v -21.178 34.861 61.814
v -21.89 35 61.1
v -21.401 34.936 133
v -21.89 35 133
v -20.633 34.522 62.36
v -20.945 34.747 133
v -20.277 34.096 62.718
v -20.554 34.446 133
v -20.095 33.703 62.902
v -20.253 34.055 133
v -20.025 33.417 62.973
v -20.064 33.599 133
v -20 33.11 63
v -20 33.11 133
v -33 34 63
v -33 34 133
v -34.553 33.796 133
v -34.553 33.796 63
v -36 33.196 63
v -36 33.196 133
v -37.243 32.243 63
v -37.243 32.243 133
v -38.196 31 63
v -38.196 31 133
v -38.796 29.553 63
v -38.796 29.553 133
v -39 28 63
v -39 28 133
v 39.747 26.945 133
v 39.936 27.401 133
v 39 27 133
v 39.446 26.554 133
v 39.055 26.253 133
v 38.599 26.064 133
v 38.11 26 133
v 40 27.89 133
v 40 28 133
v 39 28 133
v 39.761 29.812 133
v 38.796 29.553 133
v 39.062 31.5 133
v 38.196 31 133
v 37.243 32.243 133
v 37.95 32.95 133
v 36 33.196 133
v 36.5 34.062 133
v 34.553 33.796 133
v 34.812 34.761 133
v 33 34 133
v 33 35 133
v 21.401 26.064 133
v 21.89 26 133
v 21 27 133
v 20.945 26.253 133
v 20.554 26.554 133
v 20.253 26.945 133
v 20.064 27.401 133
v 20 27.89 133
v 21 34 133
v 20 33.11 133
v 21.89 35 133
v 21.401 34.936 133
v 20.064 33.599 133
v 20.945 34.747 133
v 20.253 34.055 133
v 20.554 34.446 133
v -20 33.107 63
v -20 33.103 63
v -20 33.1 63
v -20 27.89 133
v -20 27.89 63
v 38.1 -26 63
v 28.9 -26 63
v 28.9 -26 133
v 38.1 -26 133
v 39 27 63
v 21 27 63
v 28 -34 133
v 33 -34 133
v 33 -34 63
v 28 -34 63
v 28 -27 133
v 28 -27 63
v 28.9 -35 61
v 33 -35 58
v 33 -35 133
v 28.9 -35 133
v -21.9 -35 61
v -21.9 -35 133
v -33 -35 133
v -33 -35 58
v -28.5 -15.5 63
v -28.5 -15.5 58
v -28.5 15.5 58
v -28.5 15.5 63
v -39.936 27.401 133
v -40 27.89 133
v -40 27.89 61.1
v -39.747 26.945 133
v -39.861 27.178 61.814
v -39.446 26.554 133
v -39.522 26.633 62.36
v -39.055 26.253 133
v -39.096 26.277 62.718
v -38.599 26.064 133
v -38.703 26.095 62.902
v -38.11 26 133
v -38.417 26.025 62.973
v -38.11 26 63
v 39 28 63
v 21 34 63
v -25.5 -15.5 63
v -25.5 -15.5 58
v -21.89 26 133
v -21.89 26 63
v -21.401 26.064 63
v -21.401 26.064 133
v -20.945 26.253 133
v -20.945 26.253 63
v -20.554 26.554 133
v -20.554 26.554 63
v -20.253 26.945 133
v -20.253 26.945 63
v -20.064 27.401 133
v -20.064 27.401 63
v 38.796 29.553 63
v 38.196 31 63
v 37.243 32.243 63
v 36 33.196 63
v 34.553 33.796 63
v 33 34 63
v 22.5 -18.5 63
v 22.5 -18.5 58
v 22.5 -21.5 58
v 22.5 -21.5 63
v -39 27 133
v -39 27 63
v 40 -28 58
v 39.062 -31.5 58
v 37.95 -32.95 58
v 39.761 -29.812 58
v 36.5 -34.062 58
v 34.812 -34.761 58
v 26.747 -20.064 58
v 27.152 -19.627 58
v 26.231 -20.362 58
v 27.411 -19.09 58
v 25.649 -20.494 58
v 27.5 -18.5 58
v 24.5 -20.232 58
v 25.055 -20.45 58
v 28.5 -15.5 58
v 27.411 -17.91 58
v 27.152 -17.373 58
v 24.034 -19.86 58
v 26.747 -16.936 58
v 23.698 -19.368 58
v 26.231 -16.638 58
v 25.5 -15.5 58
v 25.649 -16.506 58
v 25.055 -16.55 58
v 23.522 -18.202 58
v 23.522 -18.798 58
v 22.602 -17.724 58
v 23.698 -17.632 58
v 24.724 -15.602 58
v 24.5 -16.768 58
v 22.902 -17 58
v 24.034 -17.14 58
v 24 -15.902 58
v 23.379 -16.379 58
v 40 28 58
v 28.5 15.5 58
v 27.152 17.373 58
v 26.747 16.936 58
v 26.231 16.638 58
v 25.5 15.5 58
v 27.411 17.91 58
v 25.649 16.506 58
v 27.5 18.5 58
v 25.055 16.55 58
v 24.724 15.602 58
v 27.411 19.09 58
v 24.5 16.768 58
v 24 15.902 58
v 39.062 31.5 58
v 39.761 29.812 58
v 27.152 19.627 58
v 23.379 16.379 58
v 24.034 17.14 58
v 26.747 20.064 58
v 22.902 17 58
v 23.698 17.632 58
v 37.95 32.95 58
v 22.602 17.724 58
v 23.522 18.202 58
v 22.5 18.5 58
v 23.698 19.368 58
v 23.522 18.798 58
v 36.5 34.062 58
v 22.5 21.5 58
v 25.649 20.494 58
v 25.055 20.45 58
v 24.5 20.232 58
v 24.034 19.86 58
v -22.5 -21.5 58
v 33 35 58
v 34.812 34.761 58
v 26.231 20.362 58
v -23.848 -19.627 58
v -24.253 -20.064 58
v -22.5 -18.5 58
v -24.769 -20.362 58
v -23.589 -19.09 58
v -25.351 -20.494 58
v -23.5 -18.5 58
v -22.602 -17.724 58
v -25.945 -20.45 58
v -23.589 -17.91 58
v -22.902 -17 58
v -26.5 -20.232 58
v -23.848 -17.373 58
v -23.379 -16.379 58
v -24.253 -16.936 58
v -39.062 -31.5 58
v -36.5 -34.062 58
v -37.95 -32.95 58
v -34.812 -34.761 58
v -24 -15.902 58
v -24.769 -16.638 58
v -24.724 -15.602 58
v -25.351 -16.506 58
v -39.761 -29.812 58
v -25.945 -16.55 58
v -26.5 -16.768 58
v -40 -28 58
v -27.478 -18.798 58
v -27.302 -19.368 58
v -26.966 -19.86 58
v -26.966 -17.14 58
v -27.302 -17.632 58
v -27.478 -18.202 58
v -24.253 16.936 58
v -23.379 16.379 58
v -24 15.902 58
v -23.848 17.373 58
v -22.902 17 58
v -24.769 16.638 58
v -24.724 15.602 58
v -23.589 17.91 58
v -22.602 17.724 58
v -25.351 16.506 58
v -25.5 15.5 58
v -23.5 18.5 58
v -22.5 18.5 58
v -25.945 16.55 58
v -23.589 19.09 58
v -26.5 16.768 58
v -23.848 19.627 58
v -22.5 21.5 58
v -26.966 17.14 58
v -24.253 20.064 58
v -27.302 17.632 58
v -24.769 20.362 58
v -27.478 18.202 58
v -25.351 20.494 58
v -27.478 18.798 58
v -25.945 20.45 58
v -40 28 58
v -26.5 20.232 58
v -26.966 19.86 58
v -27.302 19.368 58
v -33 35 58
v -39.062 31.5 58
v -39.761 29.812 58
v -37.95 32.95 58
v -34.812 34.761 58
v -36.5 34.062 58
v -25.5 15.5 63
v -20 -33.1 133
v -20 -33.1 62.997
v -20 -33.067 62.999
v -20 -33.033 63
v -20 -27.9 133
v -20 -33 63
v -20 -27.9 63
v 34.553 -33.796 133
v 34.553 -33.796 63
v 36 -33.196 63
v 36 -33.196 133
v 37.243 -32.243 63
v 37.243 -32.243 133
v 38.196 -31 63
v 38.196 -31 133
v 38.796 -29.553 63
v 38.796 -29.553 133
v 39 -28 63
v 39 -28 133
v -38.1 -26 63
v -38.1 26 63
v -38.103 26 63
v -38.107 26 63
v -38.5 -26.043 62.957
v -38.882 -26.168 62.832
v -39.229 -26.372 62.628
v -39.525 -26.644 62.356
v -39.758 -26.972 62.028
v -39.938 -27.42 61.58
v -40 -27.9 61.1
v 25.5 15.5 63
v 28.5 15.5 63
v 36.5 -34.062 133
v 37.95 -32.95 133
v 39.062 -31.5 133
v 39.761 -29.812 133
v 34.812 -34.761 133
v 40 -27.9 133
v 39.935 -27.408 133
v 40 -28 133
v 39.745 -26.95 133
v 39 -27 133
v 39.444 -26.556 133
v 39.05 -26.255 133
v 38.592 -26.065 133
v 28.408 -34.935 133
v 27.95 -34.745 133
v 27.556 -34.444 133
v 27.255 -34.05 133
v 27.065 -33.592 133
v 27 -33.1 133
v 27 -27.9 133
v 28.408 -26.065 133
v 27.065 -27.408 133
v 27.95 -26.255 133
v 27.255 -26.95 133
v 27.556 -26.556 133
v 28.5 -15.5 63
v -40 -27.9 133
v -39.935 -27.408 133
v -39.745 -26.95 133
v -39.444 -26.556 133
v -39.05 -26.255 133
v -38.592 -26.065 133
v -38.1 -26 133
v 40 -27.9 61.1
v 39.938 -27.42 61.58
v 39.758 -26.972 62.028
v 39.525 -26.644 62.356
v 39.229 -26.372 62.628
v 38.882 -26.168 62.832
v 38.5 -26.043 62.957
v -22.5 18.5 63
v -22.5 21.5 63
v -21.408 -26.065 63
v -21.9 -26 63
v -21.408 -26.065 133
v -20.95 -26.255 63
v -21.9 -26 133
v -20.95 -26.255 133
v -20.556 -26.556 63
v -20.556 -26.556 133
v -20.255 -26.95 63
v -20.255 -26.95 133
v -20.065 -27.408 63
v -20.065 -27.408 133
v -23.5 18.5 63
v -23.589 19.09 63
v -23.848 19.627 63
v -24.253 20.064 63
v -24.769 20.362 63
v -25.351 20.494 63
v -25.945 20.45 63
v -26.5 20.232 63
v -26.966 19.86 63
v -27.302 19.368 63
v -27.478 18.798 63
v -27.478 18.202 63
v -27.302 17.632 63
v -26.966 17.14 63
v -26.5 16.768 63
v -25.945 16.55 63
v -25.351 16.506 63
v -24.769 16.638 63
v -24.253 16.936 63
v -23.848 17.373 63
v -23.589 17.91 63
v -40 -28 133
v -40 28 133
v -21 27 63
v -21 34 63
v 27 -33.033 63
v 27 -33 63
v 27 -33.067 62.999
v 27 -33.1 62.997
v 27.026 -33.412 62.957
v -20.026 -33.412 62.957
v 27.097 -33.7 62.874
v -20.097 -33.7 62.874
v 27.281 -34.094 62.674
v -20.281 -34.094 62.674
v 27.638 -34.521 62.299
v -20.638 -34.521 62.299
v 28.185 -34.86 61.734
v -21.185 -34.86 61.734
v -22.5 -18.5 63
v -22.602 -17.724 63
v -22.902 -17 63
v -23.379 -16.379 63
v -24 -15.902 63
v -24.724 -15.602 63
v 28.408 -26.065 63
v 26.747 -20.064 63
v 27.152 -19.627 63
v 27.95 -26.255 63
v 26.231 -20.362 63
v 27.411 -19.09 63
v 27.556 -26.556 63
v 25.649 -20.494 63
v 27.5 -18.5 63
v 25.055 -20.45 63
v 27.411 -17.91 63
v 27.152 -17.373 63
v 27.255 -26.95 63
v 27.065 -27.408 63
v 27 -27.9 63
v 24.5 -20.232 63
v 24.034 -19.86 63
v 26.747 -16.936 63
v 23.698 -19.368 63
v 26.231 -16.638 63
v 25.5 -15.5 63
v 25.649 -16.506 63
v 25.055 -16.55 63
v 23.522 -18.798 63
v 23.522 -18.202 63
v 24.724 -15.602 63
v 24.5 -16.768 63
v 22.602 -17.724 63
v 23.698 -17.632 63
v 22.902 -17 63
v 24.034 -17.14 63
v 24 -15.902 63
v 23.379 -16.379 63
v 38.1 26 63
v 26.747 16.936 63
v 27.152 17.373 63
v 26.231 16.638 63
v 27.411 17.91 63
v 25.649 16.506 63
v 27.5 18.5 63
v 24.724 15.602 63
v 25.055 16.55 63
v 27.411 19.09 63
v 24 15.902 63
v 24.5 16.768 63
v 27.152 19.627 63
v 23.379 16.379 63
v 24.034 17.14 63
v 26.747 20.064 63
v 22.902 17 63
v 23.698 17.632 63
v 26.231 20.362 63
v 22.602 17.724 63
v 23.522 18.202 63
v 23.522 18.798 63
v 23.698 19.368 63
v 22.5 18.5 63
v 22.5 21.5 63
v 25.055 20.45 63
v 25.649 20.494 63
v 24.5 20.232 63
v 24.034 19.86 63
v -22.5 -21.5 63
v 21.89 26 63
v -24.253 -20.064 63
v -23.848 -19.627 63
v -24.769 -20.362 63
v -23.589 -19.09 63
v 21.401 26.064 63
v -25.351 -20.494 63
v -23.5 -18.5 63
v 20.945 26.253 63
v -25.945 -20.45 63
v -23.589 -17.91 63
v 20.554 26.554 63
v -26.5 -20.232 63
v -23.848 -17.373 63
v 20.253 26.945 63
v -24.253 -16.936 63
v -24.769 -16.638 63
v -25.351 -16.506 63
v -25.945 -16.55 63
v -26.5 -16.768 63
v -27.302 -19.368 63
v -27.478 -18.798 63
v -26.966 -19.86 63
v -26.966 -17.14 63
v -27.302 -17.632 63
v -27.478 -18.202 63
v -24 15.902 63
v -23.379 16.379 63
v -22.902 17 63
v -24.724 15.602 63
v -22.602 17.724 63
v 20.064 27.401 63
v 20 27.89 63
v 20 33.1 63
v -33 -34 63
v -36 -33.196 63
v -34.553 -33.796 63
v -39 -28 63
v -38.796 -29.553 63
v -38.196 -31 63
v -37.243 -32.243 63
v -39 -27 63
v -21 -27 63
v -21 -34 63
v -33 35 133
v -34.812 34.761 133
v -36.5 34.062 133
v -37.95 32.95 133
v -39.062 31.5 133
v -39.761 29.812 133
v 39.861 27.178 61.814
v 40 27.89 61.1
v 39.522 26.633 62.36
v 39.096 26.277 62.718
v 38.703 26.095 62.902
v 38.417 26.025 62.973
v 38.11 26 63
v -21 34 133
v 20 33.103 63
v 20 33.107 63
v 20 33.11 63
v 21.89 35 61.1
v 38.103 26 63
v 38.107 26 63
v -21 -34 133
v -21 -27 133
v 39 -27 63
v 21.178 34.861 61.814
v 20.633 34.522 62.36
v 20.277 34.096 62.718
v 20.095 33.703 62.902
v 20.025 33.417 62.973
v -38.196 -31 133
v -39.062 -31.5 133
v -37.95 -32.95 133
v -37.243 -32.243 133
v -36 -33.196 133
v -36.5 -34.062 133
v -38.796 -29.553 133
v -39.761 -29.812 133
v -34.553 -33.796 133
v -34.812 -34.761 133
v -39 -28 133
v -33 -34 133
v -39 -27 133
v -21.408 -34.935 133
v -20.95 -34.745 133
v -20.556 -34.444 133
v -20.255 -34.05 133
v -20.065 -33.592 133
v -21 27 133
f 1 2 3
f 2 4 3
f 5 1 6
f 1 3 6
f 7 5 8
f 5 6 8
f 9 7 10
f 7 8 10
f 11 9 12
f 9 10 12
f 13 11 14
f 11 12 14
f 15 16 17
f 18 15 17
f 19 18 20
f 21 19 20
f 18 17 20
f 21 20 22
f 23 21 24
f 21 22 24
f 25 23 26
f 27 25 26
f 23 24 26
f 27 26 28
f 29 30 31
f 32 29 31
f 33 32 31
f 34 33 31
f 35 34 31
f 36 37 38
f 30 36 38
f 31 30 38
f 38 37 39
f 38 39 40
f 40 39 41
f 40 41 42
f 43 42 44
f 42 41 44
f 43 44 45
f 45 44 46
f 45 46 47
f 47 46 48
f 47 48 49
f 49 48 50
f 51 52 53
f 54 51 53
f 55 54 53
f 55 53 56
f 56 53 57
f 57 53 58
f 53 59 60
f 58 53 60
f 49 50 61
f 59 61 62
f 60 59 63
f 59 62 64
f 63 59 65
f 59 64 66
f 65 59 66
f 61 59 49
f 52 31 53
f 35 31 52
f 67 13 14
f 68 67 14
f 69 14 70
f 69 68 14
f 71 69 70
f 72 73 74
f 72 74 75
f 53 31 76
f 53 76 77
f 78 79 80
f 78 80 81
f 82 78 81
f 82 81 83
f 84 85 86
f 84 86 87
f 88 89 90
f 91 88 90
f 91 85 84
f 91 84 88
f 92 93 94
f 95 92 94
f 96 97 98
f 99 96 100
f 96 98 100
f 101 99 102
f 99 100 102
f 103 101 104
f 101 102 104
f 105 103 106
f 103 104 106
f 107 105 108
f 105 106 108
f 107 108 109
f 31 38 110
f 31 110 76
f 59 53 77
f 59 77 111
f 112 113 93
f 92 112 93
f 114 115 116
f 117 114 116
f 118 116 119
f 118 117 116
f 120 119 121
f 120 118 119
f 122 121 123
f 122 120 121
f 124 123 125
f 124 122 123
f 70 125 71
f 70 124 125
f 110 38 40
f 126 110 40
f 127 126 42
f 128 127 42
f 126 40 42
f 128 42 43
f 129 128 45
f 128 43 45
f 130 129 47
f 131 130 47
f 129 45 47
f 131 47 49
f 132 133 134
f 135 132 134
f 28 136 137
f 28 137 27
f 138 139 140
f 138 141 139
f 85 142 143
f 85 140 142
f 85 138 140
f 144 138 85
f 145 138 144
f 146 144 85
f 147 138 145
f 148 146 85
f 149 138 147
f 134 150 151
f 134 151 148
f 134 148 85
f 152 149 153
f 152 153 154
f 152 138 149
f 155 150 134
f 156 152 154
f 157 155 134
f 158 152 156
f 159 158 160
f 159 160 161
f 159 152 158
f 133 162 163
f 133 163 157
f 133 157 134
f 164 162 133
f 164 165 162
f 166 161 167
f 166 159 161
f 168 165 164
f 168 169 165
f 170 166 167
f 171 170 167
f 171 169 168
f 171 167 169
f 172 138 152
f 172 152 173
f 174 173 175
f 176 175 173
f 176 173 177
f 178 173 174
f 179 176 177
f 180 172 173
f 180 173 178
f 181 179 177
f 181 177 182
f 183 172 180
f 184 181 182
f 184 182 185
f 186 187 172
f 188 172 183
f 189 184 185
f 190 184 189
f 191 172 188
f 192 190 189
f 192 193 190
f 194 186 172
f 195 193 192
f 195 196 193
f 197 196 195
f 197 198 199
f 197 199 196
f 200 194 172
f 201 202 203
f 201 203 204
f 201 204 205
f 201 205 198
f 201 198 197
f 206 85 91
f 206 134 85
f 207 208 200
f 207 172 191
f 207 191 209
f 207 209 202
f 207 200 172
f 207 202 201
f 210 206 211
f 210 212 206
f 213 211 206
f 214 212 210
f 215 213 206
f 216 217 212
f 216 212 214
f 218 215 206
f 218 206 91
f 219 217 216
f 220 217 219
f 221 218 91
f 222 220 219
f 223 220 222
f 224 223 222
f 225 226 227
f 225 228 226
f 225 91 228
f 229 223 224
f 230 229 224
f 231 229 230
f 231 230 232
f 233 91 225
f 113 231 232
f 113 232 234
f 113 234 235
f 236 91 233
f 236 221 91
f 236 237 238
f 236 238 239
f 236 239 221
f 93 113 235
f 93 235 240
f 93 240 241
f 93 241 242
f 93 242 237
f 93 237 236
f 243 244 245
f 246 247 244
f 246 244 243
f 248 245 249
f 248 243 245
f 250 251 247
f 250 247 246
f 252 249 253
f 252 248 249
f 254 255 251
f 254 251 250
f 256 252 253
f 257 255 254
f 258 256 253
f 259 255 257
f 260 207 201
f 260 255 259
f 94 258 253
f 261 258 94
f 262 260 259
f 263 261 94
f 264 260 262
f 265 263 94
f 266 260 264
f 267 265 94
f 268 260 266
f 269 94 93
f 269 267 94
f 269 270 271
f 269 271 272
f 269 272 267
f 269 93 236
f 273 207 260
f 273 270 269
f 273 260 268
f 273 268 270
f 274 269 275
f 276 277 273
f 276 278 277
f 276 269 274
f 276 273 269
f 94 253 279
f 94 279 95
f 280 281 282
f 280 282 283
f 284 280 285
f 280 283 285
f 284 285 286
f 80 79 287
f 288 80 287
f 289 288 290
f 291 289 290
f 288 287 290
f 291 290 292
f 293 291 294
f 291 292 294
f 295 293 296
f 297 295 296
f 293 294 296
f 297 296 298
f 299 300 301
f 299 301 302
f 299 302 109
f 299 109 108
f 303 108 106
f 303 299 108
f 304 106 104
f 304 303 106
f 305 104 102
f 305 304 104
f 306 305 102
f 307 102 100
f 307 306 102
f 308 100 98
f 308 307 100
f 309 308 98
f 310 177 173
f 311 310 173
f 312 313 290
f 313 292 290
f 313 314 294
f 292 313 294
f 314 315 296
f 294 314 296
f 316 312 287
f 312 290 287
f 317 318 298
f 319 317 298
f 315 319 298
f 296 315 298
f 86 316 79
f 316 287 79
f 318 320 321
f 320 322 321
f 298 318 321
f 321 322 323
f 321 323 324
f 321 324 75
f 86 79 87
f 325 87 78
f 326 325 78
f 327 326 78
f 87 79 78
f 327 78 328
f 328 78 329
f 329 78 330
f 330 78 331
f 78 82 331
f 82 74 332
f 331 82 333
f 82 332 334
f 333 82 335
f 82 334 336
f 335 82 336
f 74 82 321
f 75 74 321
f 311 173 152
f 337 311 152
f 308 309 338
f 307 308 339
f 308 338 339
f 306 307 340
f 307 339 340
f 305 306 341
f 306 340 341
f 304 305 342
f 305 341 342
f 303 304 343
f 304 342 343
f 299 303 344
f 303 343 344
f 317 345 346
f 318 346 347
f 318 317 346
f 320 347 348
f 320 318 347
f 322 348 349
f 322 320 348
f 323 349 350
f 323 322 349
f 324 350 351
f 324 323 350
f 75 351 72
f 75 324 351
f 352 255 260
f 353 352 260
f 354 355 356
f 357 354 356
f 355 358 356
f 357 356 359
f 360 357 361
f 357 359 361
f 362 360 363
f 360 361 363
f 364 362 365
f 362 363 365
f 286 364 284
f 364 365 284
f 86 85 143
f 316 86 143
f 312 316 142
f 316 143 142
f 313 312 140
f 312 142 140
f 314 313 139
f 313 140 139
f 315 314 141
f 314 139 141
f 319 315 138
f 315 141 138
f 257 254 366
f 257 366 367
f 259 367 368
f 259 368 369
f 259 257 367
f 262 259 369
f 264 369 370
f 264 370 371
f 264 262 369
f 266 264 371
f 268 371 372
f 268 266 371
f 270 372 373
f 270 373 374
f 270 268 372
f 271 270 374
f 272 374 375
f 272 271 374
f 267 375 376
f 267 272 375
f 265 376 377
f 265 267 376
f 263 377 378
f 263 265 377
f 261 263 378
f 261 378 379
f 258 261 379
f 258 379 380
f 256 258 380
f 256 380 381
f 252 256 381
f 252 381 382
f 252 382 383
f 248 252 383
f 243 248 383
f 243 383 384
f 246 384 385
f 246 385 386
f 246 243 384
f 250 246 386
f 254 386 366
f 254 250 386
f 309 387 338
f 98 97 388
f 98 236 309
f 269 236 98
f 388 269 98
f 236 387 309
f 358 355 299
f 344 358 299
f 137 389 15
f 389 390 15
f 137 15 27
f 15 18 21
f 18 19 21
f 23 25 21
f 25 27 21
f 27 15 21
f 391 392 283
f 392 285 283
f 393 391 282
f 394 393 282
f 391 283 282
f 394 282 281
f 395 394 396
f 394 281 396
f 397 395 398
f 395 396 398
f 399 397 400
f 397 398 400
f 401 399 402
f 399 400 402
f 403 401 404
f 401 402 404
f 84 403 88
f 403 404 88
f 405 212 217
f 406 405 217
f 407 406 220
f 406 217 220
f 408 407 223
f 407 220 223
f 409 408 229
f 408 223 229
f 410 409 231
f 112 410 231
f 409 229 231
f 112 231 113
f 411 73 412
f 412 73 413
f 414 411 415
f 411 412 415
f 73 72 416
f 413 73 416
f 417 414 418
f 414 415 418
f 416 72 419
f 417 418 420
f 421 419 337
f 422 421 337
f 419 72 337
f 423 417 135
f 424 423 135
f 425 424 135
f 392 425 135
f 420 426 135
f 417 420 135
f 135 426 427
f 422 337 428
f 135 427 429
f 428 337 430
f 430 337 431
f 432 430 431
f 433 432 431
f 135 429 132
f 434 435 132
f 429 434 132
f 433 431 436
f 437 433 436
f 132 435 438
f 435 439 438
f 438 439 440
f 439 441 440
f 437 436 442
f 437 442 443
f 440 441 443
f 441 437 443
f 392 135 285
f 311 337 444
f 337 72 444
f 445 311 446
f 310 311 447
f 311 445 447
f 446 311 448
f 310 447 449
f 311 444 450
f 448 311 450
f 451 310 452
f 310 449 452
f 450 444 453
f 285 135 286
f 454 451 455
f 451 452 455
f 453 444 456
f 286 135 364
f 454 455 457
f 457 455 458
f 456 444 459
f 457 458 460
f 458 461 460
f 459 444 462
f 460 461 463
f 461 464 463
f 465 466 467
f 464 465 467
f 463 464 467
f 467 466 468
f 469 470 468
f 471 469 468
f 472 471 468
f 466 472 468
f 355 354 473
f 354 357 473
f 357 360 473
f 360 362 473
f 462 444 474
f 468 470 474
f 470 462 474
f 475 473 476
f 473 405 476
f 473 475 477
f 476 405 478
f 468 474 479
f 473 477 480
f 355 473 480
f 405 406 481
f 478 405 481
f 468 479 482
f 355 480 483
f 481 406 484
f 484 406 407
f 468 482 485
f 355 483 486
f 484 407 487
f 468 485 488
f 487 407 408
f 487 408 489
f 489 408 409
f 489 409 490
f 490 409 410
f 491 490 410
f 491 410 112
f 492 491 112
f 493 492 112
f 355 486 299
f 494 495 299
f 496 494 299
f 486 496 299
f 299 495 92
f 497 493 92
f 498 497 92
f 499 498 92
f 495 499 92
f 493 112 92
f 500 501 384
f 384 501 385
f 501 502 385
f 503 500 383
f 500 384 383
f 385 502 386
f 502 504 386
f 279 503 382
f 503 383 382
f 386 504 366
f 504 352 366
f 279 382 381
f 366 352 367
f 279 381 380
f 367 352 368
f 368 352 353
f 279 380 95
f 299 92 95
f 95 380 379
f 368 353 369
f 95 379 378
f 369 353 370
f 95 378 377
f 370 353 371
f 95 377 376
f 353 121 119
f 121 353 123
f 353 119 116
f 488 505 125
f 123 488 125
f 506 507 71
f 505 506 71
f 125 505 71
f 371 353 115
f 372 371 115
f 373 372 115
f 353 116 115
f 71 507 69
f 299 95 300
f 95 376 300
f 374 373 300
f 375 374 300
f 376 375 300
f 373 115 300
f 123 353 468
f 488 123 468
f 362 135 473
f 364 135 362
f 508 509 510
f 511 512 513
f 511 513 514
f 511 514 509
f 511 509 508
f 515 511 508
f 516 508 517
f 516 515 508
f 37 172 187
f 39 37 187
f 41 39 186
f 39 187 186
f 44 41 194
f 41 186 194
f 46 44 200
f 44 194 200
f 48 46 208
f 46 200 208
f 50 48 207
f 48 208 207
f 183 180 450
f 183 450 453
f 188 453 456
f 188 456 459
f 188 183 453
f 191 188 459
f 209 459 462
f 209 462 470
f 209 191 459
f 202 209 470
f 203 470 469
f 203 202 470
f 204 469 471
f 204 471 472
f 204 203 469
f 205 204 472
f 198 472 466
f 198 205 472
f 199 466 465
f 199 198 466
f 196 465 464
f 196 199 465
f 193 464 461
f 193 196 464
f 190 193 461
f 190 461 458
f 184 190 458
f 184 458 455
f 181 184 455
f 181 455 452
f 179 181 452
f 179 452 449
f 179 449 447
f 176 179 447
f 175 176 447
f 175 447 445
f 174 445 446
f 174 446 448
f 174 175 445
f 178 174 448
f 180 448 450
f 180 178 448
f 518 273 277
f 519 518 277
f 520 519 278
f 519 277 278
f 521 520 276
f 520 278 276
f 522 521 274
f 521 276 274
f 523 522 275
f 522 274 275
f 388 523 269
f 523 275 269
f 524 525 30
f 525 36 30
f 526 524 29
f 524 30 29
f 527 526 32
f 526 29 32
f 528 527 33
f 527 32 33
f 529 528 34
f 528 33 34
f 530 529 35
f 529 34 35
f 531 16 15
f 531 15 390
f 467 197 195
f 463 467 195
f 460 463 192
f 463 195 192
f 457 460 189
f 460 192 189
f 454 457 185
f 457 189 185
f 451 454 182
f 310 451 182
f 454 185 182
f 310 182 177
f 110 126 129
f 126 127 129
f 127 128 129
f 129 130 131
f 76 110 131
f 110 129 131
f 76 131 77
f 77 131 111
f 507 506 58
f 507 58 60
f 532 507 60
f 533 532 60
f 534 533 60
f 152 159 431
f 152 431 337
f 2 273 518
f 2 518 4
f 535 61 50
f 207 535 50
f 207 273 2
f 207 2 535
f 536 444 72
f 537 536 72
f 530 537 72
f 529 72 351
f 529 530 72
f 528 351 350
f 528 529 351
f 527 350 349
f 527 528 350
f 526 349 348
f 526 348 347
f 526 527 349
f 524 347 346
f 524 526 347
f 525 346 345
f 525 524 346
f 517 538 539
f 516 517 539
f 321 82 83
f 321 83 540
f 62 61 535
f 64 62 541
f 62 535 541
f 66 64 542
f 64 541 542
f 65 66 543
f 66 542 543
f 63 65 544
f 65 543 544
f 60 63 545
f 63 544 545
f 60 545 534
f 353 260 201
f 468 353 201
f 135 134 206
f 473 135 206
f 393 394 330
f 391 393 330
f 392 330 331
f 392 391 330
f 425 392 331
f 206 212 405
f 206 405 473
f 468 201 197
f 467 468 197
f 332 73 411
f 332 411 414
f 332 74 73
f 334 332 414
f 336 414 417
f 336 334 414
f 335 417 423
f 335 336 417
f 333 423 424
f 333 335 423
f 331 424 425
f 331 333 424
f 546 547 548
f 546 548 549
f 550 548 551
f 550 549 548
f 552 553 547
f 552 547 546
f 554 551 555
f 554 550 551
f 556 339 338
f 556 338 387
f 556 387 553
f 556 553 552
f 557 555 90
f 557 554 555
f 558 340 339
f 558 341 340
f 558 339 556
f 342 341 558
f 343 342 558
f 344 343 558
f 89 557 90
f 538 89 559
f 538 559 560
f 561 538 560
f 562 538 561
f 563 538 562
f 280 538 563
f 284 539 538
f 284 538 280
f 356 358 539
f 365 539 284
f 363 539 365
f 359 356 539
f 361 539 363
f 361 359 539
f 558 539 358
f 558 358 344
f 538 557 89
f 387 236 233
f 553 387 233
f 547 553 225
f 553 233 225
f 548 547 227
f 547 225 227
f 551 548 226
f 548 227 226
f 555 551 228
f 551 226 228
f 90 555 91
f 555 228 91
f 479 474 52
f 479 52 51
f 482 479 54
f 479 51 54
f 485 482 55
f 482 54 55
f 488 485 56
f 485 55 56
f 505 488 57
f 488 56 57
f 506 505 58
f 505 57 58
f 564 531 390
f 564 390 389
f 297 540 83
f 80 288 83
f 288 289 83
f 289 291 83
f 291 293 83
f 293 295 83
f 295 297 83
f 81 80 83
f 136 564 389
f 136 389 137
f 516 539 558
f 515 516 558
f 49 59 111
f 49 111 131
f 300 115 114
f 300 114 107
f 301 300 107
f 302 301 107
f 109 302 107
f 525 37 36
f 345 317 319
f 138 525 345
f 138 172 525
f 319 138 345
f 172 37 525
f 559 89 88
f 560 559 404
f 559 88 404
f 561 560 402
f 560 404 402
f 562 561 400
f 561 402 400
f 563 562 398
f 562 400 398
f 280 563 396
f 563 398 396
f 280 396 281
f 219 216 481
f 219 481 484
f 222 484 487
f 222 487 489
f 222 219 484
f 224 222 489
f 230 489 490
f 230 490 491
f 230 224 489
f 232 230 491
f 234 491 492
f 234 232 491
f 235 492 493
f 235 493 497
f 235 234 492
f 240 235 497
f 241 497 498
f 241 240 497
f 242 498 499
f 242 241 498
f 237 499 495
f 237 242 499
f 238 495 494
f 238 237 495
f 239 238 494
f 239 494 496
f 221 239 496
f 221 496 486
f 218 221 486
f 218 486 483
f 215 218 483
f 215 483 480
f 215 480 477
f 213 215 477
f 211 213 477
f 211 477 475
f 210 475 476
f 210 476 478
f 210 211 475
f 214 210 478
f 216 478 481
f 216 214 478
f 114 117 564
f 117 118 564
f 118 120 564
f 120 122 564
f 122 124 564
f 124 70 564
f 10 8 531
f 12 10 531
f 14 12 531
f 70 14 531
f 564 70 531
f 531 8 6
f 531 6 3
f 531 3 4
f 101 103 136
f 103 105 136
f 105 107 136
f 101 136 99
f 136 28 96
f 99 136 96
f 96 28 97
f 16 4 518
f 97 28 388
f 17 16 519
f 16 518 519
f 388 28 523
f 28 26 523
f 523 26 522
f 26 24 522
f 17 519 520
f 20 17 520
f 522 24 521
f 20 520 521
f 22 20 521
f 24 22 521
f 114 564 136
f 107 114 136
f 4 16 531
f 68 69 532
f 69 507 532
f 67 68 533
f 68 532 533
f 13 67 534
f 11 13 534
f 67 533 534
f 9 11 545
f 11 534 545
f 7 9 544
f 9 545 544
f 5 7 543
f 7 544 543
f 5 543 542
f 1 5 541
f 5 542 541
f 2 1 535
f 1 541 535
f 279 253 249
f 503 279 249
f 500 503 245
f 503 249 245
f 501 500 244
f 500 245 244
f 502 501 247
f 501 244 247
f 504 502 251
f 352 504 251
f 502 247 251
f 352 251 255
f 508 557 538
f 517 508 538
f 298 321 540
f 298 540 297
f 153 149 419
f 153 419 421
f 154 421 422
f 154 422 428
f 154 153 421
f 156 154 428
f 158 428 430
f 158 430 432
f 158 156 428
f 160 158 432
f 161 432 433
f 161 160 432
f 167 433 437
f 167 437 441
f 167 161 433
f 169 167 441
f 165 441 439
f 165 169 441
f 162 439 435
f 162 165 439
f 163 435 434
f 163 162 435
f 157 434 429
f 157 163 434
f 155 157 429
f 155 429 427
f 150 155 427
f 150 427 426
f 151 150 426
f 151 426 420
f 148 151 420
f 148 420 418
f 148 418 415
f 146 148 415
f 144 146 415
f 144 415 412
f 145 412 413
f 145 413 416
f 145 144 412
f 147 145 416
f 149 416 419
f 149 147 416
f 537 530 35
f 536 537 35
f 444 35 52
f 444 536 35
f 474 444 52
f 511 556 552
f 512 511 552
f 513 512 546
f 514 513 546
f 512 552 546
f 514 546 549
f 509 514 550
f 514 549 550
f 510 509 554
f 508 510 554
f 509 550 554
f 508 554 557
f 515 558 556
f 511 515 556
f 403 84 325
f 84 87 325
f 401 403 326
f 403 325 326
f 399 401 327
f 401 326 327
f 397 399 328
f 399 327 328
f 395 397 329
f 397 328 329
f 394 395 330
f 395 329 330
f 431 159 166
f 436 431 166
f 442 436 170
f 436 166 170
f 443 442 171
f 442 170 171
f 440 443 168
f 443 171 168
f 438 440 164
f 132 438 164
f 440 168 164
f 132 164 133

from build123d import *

# Parameters (mm, degrees)
SKETCH005_R     = 2
PAD003_DEPTH    = 5
PAD004_DEPTH    = 70
POCKET001_DEPTH = 70
FILLET017_R     = 2
FILLET018_R     = 1.9
FILLET019_R     = 1.9
FILLET020_R     = 1.9
FILLET021_R     = 1.89


with BuildPart() as part:
    # Sketch005 (on DatumPlane) → Pad003 (new body)
    with BuildSketch(Plane.XY.offset(58)):
        with BuildLine():
            Line((-33, 35), (33, 35))
            ThreePointArc((40, 28), (37.949747, 32.949747), (33, 35))
            Line((40, 28), (40, -28))
            ThreePointArc((33, -35), (37.949747, -32.949747), (40, -28))
            Line((33, -35), (-33, -35))
            ThreePointArc((-40, -28), (-37.949747, -32.949747), (-33, -35))
            Line((-40, -28), (-40, 28))
            ThreePointArc((-33, 35), (-37.949747, 32.949747), (-40, 28))
        make_face()
        with Locations((-25.5, 18.5)):
            Circle(SKETCH005_R, mode=Mode.SUBTRACT)
        with Locations((-25.5, -18.5)):
            Circle(SKETCH005_R, mode=Mode.SUBTRACT)
        with Locations((25.5, -18.5)):
            Circle(SKETCH005_R, mode=Mode.SUBTRACT)
        with Locations((25.5, 18.5)):
            Circle(SKETCH005_R, mode=Mode.SUBTRACT)
        with BuildLine():
            Line((28.5, 15.5), (28.5, -15.5))
            Line((25.5, -15.5), (28.5, -15.5))
            ThreePointArc((25.5, -15.5), (23.37868, -16.37868), (22.5, -18.5))
            Line((22.5, -18.5), (22.5, -21.5))
            Line((22.5, -21.5), (-22.5, -21.5))
            Line((-22.5, -18.5), (-22.5, -21.5))
            ThreePointArc((-22.5, -18.5), (-23.37868, -16.37868), (-25.5, -15.5))
            Line((-25.5, -15.5), (-28.5, -15.5))
            Line((-28.5, -15.5), (-28.5, 15.5))
            Line((-25.5, 15.5), (-28.5, 15.5))
            ThreePointArc((-25.5, 15.5), (-23.37868, 16.37868), (-22.5, 18.5))
            Line((-22.5, 18.5), (-22.5, 21.5))
            Line((-22.5, 21.5), (22.5, 21.5))
            Line((22.5, 21.5), (22.5, 18.5))
            ThreePointArc((22.5, 18.5), (23.37868, 16.37868), (25.5, 15.5))
            Line((25.5, 15.5), (28.5, 15.5))
        make_face(mode=Mode.SUBTRACT)
    extrude(amount=PAD003_DEPTH)

    # Sketch006 (on DatumPlane) → Pad004 (join)
    with BuildSketch(Plane.XY.offset(63)):
        with BuildLine():
            Line((20, 35), (33, 35))
            ThreePointArc((40, 28), (37.949747, 32.949747), (33, 35))
            Line((40, 28), (40, 26))
            Line((40, 26), (20, 26))
            Line((20, 26), (20, 35))
        make_face()
        with BuildLine():
            Line((-20, -26), (-40, -26))
            Line((-40, -26), (-40, -28))
            ThreePointArc((-40, -28), (-37.949747, -32.949747), (-33, -35))
            Line((-33, -35), (-20, -35))
            Line((-20, -35), (-20, -26))
        make_face()
        with BuildLine():
            Line((-20, 26), (-40, 26))
            Line((-40, 26), (-40, 28))
            ThreePointArc((-33, 35), (-37.949747, 32.949747), (-40, 28))
            Line((-33, 35), (-20, 35))
            Line((-20, 35), (-20, 26))
        make_face()
        with BuildLine():
            Line((27, -26), (40, -26))
            Line((40, -26), (40, -28))
            ThreePointArc((33, -35), (37.949747, -32.949747), (40, -28))
            Line((33, -35), (27, -35))
            Line((27, -35), (27, -26))
        make_face()
    extrude(amount=PAD004_DEPTH)

    # Sketch007 (on DatumPlane) → Pocket001 (cut)
    with BuildSketch(Plane.XY.offset(133)):
        with BuildLine():
            Line((21, 34), (33, 34))
            ThreePointArc((39, 28), (37.242641, 32.242641), (33, 34))
            Line((39, 28), (39, 27))
            Line((39, 27), (21, 27))
            Line((21, 27), (21, 34))
        make_face()
        with BuildLine():
            Line((-21, -27), (-39, -27))
            Line((-39, -27), (-39, -28))
            ThreePointArc((-39, -28), (-37.242641, -32.242641), (-33, -34))
            Line((-33, -34), (-21, -34))
            Line((-21, -34), (-21, -27))
        make_face()
        with BuildLine():
            Line((-21, 27), (-39, 27))
            Line((-39, 27), (-39, 28))
            ThreePointArc((-33, 34), (-37.242641, 32.242641), (-39, 28))
            Line((-33, 34), (-21, 34))
            Line((-21, 34), (-21, 27))
        make_face()
        with BuildLine():
            Line((28, -27), (39, -27))
            Line((39, -27), (39, -28))
            ThreePointArc((33, -34), (37.242641, -32.242641), (39, -28))
            Line((33, -34), (28, -34))
            Line((28, -34), (28, -27))
        make_face()
    extrude(amount=-POCKET001_DEPTH, mode=Mode.SUBTRACT)

    # Fillet017
    fillet017_edges = [part.edges().sort_by_distance(p)[0] for p in [
        (3.5, -35, 63),
    ]]
    fillet(fillet017_edges, radius=FILLET017_R)

    # Fillet018
    fillet018_edges = [part.edges().sort_by_distance(p)[0] for p in [
        (-20, -35, 98),
        (-20, -26, 98),
        (27, -35, 98),
        (27, -26, 98),
        (-40, -26, 98),
        (40, -26, 98),
    ]]
    fillet(fillet018_edges, radius=FILLET018_R)

    # Fillet019
    fillet019_edges = [part.edges().sort_by_distance(p)[0] for p in [
        (40, 0, 63),
        (-40, 0, 63),
    ]]
    fillet(fillet019_edges, radius=FILLET019_R)

    # Fillet020
    fillet020_edges = [part.edges().sort_by_distance(p)[0] for p in [
        (0, 35, 63),
    ]]
    fillet(fillet020_edges, radius=FILLET020_R)

    # Fillet021
    fillet021_edges = [part.edges().sort_by_distance(p)[0] for p in [
        (-40, 26, 98),
        (-20, 35, 98),
        (20, 35, 98),
        (20, 26, 98),
        (-20, 26, 98),
        (40, 26, 98),
    ]]
    fillet(fillet021_edges, radius=FILLET021_R)


solid = part.part
